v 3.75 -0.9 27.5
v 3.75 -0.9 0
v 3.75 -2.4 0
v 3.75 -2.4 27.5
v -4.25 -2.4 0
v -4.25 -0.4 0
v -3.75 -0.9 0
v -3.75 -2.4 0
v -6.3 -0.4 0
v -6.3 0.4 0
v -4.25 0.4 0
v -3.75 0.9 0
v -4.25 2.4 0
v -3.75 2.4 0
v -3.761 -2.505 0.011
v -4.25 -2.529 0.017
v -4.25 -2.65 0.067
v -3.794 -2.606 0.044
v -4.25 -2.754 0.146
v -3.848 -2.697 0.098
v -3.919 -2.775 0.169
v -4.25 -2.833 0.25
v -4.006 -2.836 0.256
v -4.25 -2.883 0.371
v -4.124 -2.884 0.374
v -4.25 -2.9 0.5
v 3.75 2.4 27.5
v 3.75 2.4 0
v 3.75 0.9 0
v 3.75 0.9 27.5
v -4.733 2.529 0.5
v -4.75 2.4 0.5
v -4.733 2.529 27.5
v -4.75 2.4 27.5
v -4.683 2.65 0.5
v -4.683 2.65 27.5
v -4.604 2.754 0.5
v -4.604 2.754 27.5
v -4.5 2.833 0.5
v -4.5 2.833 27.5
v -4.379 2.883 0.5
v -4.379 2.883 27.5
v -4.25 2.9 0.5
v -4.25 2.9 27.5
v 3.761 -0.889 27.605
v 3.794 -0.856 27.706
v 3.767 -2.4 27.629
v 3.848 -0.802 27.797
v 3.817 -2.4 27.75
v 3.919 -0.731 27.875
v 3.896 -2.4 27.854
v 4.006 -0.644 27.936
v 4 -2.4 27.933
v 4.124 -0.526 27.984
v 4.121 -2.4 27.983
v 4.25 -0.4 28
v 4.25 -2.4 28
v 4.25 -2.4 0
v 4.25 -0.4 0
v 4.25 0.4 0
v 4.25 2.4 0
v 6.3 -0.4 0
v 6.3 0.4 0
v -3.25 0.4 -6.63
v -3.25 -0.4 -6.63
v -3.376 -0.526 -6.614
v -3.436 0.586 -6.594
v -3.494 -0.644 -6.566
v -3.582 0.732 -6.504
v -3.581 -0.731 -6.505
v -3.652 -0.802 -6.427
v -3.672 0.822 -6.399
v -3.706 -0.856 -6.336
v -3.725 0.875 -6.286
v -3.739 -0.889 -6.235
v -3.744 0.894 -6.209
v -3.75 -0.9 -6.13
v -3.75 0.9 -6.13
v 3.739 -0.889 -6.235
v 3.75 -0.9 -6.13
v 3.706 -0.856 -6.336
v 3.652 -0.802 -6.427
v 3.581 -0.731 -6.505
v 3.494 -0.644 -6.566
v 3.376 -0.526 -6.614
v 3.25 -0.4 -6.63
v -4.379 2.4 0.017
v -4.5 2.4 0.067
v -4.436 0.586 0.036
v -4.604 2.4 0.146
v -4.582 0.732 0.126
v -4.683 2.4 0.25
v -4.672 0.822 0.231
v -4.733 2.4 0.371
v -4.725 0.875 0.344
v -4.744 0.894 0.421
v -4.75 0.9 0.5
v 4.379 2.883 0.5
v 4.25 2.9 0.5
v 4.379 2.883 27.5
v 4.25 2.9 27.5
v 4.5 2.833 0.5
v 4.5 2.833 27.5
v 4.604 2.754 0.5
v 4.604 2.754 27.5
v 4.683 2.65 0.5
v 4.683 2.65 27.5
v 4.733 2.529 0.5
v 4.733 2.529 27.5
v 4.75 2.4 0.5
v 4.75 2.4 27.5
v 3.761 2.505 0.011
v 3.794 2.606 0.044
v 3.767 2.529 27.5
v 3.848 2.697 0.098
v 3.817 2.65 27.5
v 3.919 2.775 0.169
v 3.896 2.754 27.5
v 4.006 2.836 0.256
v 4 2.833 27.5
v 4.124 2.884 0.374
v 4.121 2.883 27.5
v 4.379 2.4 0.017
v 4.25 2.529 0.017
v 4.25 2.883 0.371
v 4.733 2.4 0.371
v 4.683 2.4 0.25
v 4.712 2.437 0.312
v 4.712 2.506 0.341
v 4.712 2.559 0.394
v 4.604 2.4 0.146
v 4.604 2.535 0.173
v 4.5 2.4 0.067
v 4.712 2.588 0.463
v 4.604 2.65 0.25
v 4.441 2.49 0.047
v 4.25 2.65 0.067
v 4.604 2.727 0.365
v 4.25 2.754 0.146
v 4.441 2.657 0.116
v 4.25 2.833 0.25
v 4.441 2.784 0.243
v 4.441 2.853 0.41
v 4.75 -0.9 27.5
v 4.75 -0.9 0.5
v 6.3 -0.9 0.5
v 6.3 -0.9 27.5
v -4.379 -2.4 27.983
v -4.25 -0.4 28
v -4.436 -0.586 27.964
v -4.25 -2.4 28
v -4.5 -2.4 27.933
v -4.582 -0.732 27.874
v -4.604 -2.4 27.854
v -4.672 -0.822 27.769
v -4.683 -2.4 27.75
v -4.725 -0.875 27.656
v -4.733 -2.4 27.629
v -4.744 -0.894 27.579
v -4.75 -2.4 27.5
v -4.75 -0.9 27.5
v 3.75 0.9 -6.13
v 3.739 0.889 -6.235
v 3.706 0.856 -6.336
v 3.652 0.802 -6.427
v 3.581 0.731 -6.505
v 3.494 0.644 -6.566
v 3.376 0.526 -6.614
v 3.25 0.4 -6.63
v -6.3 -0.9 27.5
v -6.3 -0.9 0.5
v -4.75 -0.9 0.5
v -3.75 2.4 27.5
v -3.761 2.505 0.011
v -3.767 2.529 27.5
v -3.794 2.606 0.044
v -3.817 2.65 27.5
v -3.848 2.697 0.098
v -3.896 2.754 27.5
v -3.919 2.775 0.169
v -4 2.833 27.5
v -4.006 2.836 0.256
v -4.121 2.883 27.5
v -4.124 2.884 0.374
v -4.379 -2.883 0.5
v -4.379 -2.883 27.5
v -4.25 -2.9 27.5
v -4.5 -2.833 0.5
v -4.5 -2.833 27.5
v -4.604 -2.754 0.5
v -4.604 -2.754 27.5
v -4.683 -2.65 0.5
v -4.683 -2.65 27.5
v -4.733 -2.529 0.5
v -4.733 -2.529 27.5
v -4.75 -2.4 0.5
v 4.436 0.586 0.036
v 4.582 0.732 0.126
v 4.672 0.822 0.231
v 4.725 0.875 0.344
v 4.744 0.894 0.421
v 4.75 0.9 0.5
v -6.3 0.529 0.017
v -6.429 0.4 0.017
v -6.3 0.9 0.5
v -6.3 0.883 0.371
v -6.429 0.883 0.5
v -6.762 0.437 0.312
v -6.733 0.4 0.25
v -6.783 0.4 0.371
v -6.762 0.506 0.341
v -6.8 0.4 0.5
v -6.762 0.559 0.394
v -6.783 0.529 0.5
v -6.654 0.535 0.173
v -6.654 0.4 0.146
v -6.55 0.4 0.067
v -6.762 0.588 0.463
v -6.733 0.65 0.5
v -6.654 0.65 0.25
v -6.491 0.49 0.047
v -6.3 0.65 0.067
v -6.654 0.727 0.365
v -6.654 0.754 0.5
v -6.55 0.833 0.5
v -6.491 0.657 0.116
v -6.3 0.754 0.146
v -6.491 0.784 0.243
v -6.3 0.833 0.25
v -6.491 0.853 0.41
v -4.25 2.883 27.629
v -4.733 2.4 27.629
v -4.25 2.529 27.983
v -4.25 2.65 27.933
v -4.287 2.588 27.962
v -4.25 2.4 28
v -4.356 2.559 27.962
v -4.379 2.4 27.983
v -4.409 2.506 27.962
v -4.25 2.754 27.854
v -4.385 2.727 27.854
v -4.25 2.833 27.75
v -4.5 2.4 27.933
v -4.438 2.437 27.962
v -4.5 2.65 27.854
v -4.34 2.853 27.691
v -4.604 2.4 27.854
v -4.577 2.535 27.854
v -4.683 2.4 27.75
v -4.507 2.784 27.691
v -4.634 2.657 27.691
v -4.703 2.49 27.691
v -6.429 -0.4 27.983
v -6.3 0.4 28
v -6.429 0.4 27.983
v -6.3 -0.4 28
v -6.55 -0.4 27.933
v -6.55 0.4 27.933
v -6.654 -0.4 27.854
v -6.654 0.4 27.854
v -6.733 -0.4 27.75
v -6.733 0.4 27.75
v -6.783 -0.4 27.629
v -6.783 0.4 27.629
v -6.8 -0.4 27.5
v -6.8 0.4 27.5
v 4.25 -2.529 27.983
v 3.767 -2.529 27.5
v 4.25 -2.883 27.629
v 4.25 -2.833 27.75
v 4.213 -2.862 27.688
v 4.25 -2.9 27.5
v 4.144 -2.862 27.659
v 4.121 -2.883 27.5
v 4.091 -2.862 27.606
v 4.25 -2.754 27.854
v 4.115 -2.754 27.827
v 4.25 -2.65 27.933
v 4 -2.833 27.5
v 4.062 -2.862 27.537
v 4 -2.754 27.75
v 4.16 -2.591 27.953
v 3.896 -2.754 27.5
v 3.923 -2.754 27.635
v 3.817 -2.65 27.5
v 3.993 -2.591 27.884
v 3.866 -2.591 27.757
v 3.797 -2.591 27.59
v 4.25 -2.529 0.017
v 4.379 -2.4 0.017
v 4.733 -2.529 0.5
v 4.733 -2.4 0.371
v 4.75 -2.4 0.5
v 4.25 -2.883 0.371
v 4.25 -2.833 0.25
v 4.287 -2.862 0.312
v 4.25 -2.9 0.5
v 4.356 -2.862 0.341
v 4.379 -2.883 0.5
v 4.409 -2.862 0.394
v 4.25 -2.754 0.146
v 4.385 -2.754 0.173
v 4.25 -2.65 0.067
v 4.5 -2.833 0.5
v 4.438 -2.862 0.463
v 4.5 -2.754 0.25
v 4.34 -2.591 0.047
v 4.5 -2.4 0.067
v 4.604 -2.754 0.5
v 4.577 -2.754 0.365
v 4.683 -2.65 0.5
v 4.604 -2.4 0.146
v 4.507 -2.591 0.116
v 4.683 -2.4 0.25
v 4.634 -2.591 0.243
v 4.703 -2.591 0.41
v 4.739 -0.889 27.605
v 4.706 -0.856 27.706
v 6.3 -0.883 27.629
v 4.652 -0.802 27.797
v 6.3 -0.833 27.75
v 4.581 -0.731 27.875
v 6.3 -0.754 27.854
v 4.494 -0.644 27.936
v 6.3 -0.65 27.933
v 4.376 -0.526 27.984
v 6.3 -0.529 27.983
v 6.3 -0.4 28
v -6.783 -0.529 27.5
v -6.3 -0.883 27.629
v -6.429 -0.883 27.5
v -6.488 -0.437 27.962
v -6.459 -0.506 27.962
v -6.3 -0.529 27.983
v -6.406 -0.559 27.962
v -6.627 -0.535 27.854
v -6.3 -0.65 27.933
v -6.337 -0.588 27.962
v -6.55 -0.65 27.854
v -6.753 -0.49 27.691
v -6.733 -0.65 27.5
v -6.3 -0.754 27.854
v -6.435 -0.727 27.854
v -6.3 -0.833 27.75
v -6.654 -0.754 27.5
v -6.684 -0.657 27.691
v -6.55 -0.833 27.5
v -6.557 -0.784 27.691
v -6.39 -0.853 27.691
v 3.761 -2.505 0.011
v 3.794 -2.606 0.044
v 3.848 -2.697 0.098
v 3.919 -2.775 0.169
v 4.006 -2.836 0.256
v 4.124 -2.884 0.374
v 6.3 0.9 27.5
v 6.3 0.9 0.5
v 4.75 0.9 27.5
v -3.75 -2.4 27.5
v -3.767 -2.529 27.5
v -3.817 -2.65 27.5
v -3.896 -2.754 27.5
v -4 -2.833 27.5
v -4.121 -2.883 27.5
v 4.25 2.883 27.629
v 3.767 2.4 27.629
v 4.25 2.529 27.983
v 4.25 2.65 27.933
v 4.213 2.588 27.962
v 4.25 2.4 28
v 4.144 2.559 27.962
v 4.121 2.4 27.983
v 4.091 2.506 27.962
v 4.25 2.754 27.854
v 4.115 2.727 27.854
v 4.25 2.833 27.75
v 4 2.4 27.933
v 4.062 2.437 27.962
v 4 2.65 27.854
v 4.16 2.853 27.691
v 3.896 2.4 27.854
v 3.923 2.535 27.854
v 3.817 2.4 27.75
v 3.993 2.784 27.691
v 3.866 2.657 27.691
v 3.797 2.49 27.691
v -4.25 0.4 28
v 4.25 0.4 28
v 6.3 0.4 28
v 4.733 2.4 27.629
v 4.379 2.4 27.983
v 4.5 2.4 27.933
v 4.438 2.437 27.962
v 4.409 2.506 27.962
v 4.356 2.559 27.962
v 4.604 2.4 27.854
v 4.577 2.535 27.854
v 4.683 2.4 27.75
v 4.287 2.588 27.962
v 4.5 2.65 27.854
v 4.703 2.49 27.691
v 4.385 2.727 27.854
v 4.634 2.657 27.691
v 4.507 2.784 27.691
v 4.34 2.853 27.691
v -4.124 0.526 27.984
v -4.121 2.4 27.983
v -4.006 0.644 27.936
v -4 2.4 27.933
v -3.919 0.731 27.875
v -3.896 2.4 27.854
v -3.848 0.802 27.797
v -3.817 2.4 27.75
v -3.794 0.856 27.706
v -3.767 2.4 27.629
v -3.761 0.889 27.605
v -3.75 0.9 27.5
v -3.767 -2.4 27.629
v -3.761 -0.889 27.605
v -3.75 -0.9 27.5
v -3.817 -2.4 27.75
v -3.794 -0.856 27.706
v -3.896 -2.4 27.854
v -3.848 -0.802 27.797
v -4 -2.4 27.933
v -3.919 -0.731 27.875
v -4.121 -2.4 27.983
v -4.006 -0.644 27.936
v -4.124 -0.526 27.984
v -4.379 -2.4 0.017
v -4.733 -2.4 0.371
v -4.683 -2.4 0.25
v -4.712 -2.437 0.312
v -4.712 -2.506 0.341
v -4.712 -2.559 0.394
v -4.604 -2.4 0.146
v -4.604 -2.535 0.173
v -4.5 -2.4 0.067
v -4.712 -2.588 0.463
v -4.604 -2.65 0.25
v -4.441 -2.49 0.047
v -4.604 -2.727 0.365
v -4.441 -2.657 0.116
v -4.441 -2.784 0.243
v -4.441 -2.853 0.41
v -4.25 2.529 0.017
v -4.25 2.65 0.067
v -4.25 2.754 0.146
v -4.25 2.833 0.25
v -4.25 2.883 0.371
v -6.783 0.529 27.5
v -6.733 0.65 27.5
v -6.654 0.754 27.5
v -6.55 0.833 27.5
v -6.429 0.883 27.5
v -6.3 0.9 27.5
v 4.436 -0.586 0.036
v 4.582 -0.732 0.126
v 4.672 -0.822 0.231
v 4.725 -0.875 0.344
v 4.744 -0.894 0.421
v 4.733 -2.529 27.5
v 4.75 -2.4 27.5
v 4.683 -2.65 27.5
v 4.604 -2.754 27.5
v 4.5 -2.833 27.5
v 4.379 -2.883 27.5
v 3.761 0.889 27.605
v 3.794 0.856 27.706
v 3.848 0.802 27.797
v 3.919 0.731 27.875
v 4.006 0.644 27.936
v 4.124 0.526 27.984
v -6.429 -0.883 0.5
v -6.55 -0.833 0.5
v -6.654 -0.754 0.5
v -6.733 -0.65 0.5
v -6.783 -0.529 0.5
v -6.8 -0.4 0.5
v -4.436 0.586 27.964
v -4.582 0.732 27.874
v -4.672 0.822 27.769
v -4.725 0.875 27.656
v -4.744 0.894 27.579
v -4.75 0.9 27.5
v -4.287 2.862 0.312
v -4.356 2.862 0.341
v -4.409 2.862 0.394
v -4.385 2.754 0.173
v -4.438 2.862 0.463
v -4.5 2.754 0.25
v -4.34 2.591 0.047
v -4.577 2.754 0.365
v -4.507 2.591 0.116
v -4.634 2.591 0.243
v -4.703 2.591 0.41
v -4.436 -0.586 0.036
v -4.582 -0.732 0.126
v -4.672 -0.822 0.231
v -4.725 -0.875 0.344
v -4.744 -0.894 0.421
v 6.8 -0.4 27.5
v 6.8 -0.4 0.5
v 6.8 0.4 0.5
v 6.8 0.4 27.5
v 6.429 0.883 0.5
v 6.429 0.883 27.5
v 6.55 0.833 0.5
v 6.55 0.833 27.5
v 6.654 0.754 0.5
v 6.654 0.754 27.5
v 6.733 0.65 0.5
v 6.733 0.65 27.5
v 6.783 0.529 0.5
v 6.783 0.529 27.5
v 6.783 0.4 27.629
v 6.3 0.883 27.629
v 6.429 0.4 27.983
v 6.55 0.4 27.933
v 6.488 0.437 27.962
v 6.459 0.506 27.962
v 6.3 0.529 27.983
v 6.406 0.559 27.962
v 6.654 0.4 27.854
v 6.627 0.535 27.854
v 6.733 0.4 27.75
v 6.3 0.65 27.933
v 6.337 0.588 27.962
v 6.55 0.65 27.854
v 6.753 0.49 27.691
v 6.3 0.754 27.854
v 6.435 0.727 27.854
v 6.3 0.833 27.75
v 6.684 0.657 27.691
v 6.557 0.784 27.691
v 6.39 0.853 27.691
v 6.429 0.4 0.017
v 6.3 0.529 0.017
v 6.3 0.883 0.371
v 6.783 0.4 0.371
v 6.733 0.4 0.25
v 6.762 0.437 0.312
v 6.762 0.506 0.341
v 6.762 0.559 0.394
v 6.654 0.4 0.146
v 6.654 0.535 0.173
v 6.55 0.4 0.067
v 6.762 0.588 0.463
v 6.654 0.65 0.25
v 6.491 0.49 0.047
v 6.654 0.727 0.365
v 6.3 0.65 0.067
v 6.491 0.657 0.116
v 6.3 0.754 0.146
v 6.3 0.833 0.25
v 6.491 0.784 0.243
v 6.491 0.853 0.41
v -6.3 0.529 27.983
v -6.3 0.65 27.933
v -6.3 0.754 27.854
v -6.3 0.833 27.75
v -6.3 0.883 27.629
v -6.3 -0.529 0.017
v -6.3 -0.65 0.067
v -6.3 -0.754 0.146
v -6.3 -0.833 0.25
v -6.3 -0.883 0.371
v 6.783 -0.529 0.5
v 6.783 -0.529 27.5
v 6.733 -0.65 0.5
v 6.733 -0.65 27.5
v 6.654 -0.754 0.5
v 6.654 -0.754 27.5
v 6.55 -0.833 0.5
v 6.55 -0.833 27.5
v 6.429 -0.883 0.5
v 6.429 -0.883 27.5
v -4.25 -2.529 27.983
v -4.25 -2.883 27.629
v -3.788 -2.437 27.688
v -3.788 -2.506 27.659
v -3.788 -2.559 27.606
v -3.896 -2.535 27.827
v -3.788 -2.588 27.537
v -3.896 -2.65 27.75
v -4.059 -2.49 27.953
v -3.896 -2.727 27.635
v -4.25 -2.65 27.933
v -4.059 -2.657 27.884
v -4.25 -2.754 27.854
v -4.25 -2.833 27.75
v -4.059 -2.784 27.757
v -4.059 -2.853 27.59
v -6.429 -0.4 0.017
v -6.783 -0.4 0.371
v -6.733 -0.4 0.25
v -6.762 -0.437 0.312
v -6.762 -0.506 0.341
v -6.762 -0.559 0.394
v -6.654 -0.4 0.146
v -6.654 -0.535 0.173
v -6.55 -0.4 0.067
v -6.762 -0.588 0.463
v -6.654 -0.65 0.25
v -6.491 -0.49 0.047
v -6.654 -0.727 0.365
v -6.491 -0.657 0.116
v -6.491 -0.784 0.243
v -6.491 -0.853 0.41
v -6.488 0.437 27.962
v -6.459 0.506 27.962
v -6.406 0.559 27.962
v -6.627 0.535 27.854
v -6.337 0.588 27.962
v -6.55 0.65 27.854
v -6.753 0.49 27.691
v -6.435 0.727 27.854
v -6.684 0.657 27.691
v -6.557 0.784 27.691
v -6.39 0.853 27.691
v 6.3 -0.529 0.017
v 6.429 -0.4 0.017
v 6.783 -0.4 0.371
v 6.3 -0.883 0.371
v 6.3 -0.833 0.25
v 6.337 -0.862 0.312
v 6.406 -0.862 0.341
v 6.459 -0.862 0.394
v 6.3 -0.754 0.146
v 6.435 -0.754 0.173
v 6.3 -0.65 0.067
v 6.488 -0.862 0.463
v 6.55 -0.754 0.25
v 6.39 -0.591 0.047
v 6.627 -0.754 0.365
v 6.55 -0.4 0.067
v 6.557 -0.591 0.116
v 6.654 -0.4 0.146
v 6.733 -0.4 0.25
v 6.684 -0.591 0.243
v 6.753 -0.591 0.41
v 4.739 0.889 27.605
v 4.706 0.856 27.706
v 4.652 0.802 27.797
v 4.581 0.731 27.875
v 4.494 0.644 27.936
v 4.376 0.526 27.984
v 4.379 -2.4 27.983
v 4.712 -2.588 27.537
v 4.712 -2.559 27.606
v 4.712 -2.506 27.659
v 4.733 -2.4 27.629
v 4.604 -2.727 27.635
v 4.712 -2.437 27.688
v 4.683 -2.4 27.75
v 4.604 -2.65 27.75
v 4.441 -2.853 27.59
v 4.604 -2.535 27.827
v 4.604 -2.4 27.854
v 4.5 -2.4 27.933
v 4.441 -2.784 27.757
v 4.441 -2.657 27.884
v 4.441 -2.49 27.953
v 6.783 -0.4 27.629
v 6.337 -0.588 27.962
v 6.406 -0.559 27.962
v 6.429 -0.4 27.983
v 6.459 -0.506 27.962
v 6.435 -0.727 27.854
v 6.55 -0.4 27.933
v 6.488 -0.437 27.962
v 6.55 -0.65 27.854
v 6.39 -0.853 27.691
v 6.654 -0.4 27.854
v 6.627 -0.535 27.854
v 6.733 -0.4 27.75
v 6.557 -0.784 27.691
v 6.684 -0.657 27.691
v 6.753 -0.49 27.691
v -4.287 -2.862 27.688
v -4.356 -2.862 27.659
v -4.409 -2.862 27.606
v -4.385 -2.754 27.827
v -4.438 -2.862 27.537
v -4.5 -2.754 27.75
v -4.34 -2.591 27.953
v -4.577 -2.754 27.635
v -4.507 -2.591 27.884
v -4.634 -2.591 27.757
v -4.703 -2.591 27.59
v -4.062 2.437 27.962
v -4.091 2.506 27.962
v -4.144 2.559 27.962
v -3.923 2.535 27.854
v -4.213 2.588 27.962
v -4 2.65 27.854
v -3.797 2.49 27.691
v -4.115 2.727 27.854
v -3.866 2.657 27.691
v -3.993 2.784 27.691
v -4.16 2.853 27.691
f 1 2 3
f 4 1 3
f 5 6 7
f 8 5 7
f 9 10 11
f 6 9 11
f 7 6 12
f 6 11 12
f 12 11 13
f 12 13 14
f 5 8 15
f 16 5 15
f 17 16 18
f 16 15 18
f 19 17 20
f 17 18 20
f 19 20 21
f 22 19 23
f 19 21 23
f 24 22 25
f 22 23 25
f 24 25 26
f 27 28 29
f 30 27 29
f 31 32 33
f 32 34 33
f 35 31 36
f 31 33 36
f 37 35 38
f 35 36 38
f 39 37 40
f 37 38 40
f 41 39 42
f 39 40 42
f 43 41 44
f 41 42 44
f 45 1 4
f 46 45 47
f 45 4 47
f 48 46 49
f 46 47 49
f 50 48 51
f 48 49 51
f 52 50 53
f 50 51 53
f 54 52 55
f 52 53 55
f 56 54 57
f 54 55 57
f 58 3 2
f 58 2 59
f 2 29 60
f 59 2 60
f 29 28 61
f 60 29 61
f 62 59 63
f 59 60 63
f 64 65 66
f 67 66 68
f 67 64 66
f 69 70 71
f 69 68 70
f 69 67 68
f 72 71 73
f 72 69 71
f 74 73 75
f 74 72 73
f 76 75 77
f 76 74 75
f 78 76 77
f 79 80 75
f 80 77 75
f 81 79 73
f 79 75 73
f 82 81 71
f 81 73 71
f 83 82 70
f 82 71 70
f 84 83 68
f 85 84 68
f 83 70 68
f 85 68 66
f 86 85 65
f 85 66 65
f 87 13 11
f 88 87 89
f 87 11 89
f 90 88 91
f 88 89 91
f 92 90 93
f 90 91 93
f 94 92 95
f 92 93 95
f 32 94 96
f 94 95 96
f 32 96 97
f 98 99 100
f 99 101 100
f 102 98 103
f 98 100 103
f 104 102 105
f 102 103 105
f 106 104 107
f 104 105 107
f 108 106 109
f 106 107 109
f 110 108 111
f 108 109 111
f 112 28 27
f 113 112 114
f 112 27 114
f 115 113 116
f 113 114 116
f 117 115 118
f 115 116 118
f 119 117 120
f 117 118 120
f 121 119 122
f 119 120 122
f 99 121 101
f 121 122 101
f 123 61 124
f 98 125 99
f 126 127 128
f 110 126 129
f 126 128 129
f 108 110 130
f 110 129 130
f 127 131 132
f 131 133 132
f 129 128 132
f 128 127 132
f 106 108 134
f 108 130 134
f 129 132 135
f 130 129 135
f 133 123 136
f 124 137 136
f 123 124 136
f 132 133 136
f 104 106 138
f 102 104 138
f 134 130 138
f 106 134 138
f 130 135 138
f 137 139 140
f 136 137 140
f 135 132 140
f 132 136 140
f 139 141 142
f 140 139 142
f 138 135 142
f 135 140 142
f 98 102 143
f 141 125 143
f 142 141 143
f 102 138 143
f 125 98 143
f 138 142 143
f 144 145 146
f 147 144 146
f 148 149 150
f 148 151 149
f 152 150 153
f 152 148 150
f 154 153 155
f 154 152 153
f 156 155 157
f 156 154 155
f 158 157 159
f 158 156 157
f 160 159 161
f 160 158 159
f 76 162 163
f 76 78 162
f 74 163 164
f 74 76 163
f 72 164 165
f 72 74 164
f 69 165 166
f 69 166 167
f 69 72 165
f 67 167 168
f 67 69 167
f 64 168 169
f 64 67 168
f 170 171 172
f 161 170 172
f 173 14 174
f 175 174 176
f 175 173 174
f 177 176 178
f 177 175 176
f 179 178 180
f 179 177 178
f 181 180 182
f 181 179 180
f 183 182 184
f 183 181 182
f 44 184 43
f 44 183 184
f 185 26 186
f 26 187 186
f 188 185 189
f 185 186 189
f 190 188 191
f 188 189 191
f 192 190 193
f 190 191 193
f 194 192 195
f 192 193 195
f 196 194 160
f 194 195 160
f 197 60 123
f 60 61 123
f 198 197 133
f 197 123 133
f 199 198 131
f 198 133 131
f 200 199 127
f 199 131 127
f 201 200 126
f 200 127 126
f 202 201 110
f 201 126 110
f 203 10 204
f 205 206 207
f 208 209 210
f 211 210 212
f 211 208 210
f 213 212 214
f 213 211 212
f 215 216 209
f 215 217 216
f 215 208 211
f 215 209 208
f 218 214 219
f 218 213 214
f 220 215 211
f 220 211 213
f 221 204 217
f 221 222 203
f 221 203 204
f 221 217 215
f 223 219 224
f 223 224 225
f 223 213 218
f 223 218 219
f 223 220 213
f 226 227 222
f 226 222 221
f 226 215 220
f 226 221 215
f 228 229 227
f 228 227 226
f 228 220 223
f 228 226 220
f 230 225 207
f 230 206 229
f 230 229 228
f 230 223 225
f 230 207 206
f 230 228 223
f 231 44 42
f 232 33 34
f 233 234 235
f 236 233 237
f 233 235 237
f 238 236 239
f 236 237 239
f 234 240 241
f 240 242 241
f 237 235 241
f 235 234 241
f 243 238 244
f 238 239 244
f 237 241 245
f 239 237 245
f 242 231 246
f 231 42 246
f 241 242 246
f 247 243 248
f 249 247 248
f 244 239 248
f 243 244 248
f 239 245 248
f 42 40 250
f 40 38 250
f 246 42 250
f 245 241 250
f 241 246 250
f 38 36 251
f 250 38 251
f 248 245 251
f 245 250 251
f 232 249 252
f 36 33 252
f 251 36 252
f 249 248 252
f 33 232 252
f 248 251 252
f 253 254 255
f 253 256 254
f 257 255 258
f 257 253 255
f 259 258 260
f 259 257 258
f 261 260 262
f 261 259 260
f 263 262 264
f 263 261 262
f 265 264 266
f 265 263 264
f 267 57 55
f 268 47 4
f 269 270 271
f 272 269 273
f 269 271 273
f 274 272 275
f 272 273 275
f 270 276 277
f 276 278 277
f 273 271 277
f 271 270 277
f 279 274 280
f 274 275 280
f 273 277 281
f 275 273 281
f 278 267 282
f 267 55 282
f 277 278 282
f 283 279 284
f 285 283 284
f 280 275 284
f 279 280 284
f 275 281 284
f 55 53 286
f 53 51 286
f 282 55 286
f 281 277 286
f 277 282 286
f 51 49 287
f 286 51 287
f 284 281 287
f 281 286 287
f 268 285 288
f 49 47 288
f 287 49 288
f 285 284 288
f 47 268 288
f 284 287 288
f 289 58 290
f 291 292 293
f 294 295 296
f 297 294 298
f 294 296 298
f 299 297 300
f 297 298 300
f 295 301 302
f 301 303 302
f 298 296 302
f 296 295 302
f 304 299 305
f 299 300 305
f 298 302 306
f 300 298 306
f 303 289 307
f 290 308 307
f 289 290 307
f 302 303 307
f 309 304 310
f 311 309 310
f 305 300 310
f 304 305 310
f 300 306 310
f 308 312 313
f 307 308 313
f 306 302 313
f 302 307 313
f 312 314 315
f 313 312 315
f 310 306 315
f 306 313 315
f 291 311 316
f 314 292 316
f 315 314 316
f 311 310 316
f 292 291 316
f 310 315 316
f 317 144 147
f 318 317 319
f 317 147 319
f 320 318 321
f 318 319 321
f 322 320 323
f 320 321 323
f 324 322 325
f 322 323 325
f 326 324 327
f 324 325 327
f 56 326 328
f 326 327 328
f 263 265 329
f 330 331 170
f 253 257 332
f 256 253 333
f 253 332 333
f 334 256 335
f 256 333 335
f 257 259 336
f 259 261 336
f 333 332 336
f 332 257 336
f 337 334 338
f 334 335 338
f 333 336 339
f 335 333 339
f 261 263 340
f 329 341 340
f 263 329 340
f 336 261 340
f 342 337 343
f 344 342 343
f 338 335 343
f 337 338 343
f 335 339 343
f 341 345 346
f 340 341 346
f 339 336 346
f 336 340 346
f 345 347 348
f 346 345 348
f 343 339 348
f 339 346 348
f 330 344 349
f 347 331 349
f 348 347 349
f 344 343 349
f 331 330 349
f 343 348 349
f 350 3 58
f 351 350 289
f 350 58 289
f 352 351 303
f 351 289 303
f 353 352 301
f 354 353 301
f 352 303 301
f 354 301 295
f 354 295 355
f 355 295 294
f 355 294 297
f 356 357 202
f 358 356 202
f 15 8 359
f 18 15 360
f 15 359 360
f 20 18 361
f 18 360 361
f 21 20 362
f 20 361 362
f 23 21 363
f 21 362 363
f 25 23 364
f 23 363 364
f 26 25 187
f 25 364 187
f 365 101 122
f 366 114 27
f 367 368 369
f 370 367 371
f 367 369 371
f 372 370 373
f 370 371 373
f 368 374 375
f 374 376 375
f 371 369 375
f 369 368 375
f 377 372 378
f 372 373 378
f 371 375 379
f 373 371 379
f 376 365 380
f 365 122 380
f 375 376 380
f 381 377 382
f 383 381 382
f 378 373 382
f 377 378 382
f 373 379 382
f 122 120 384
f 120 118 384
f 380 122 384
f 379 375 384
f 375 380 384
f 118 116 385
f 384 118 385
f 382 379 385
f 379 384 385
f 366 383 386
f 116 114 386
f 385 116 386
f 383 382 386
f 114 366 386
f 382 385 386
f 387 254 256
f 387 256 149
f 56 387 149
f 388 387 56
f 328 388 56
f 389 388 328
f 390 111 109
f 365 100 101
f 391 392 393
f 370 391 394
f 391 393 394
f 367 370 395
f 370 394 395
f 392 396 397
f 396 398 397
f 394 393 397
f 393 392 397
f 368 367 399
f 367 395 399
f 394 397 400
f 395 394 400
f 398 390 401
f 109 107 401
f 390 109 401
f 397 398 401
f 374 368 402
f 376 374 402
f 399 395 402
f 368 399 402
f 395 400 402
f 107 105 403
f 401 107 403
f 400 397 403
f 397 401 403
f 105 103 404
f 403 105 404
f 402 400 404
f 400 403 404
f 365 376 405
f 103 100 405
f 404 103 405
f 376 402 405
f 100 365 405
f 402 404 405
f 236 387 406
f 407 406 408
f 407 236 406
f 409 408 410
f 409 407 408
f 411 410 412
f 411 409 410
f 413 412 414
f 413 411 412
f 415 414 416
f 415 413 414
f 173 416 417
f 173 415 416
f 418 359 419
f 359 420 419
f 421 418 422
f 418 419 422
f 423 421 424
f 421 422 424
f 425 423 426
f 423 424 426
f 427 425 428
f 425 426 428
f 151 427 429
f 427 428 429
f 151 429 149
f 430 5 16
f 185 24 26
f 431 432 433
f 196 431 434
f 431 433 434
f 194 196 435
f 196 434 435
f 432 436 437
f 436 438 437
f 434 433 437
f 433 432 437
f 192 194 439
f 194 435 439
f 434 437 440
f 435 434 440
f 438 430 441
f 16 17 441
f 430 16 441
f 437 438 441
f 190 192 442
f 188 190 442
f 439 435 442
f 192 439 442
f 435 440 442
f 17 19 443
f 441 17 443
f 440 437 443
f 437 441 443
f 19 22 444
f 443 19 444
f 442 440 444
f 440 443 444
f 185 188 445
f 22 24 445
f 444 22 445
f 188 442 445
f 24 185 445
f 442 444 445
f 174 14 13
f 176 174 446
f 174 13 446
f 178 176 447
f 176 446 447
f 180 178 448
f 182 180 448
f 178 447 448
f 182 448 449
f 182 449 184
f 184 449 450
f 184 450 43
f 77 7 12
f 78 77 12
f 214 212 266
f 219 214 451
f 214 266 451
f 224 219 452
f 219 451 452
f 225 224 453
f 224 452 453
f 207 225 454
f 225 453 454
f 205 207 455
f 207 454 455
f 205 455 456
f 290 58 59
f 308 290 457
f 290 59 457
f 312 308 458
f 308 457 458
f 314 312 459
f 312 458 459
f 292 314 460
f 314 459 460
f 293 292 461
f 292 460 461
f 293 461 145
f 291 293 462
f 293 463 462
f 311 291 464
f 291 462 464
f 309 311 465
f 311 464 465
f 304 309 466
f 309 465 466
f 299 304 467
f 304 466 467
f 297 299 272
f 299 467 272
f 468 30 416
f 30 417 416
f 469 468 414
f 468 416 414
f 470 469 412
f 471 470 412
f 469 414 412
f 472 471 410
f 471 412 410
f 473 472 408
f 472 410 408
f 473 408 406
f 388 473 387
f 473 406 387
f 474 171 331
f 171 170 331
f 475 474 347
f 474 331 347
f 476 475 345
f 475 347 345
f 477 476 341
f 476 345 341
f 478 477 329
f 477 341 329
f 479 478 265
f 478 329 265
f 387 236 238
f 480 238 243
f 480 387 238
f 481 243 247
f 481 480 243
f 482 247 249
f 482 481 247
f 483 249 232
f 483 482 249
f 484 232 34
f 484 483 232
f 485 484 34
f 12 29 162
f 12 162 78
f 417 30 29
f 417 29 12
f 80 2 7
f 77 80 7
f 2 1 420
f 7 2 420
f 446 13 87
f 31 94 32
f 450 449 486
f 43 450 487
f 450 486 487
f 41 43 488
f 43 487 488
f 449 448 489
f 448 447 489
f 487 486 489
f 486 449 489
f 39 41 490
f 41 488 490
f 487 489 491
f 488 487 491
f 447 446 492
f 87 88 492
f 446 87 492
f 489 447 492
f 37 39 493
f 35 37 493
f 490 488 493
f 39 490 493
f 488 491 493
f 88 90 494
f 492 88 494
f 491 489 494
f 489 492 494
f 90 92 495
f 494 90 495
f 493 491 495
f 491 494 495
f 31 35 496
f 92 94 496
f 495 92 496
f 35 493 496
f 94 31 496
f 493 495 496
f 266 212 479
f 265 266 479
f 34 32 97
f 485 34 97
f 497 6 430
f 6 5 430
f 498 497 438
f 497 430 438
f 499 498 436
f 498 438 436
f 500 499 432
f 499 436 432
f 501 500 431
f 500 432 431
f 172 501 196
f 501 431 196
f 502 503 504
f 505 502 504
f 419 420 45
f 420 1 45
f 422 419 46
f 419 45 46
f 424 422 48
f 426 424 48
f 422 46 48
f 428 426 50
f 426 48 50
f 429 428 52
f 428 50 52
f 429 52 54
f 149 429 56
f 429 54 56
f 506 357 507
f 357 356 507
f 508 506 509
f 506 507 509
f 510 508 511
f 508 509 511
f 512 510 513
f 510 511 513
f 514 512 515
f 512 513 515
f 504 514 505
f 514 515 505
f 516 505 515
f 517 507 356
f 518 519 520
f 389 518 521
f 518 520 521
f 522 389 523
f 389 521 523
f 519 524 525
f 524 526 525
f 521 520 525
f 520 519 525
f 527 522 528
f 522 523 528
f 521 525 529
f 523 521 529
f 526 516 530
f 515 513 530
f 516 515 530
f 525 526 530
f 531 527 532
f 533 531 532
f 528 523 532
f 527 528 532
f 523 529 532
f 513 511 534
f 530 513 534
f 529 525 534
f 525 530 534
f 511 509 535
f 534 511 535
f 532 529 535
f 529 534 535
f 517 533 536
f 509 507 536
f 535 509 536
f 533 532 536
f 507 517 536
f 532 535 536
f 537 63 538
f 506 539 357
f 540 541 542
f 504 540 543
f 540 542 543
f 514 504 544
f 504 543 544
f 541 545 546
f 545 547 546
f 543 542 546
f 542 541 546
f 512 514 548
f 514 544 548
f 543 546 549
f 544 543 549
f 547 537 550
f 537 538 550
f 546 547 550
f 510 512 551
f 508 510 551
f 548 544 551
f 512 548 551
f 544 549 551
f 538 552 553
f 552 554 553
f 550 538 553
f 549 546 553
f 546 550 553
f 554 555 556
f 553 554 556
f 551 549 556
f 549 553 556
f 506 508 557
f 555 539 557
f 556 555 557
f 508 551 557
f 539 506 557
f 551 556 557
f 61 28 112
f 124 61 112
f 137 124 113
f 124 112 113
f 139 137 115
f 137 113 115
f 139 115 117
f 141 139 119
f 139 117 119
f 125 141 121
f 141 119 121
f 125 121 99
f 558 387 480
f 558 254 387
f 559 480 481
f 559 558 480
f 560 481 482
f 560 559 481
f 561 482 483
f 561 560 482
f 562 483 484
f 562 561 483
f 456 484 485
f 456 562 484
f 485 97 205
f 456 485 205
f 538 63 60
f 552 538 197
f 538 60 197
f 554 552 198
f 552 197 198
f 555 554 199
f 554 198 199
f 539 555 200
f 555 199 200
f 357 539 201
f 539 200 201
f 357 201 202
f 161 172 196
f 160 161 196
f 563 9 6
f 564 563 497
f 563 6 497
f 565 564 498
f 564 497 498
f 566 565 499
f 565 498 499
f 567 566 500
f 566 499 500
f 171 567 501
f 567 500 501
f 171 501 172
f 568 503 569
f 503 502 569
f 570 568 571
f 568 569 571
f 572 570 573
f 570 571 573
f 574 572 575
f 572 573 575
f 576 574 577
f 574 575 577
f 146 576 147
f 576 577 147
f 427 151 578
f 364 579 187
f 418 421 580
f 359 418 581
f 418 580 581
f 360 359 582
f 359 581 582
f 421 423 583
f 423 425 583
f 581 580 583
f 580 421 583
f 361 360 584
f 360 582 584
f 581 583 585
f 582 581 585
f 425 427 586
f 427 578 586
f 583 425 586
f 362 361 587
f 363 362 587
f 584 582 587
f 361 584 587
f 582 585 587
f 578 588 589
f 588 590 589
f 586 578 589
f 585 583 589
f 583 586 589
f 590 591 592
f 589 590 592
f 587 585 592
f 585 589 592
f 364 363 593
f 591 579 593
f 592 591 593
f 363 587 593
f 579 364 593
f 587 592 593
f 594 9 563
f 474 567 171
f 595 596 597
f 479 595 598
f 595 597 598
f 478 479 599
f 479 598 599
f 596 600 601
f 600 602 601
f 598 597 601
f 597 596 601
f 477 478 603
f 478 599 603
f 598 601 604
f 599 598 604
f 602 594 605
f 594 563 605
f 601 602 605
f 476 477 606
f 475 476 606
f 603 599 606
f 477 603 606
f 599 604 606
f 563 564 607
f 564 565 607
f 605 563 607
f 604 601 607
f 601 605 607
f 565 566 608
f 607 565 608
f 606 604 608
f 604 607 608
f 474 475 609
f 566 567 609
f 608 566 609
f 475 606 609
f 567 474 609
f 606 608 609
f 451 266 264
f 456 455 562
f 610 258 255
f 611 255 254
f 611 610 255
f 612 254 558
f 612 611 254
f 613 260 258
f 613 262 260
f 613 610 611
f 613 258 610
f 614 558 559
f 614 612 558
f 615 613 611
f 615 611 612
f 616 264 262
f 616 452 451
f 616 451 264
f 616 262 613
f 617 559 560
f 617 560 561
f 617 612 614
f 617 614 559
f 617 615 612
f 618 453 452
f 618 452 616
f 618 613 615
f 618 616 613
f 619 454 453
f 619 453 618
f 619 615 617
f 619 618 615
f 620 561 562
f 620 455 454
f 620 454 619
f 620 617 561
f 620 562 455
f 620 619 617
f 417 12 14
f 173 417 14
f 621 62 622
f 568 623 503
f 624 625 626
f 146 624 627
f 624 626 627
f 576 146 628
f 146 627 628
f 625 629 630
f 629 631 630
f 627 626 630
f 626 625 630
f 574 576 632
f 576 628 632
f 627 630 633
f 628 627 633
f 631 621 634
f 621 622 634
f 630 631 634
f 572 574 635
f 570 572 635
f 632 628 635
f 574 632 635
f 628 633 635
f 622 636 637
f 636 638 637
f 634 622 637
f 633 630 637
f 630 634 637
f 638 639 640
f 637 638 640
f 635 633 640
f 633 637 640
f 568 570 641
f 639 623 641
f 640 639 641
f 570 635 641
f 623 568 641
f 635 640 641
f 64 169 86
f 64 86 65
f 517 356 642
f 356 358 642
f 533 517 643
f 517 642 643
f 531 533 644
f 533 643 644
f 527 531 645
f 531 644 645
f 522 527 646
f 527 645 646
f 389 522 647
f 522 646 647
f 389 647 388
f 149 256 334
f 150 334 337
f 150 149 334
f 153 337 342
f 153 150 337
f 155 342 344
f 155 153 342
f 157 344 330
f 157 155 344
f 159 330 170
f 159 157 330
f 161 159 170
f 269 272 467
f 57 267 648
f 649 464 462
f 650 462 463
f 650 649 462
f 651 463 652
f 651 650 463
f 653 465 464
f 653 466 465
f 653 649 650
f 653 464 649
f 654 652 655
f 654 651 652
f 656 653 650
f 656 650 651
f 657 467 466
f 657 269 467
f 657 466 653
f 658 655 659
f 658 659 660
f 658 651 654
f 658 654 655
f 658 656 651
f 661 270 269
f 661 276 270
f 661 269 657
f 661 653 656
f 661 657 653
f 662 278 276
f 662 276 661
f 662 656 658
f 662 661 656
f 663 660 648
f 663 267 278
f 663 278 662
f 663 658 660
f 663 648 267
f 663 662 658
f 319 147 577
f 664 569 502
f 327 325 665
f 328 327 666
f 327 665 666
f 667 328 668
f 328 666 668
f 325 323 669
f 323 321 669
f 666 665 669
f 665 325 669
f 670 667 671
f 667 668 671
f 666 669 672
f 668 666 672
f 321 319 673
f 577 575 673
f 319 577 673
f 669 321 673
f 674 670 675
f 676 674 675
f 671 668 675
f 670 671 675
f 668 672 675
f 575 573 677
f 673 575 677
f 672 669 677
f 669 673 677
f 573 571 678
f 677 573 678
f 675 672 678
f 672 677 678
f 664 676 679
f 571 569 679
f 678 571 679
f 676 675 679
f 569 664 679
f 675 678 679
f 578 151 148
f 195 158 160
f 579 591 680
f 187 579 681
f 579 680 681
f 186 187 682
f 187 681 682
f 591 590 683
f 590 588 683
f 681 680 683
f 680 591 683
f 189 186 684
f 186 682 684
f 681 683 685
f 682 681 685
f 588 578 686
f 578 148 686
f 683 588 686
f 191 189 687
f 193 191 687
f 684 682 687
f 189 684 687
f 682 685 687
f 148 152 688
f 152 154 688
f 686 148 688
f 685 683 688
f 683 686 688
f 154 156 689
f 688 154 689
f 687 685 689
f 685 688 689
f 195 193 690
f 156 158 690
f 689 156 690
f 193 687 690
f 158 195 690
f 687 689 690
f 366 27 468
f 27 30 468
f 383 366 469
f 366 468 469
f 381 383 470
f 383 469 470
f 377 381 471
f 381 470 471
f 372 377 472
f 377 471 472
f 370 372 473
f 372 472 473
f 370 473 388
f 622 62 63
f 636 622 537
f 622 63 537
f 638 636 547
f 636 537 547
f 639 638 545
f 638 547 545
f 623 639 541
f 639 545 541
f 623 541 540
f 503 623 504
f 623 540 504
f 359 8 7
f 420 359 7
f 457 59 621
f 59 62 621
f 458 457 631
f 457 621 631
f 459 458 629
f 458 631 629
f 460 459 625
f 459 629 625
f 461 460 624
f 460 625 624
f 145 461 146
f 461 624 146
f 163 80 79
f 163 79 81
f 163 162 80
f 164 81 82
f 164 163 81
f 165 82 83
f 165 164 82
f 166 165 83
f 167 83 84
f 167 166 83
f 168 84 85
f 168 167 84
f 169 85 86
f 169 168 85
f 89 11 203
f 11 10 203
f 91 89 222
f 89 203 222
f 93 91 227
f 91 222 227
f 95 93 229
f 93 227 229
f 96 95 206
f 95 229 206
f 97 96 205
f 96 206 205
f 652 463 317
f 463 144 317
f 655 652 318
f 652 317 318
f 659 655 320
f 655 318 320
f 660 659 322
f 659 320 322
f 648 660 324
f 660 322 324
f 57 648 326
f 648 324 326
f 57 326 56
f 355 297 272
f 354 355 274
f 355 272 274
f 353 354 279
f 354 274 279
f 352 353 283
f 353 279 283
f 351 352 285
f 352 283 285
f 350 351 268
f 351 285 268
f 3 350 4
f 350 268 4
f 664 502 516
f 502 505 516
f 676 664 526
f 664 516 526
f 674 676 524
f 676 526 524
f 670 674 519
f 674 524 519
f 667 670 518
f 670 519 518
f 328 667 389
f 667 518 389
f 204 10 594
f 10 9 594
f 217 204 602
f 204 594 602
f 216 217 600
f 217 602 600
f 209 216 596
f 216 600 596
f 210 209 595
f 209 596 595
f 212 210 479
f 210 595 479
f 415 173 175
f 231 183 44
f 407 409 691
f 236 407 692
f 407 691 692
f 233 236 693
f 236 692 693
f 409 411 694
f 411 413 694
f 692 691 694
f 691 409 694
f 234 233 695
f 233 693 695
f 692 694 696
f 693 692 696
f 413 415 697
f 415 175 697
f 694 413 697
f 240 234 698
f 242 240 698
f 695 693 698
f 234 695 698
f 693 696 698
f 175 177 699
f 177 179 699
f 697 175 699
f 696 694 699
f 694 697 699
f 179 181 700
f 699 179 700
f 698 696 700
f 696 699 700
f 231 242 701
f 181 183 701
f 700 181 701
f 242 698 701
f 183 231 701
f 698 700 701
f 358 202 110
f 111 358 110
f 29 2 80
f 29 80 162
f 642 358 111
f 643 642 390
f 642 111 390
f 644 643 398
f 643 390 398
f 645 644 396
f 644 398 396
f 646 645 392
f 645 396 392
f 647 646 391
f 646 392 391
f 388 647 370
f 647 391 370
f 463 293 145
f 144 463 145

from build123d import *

# Parameters (mm, degrees)
AUFSATZ_LINEAR_AUSTRAGEN1_DEPTH = 28
SKIZZE2_W                       = 7.5
SKIZZE2_H                       = 1.8
AUFSATZ_LINEAR_AUSTRAGEN2_DEPTH = 6.63
VERRUNDUNG1_R                   = 0.5


with BuildPart() as part:
    # Skizze1 → Aufsatz-Linear austragen1 (new body)
    with BuildSketch(Plane.XY):
        Polygon((-4.75, 0.9), (-6.8, 0.9), (-6.8, -0.9), (-4.75, -0.9), (-4.75, -2.9), (-3.75, -2.9), (-3.75, -0.9), (3.75, -0.9), (3.75, -2.9), (4.75, -2.9), (4.75, -0.9), (6.8, -0.9), (6.8, 0.9), (4.75, 0.9), (4.75, 2.9), (3.75, 2.9), (3.75, 0.9), (-3.75, 0.9), (-3.75, 2.9), (-4.75, 2.9), align=None)
    extrude(amount=AUFSATZ_LINEAR_AUSTRAGEN1_DEPTH)

    # Skizze2 → Aufsatz-Linear austragen2 (add)
    with BuildSketch(Plane(origin=(0, 0, 0), x_dir=(-1, 0, 0), z_dir=(0, 0, -1))):
        Rectangle(SKIZZE2_W, SKIZZE2_H)
    extrude(amount=AUFSATZ_LINEAR_AUSTRAGEN2_DEPTH)

    # Verrundung1
    verrundung1_edges = [part.edges().sort_by_distance(p)[0] for p in [
        (-4.75, -1.9, 28),
        (-4.25, -2.9, 28),
        (-5.775, 0.9, 0),
        (-4.75, 1.9, 0),
        (-4.25, 2.9, 0),
        (-3.75, -1.9, 28),
        (4.25, 2.9, 0),
        (4.75, 1.9, 0),
        (5.775, 0.9, 0),
        (6.8, 0, 0),
        (5.775, -0.9, 0),
        (4.75, -1.9, 0),
        (4.25, -2.9, 0),
        (0, -0.9, 28),
        (-4.25, -2.9, 0),
        (-4.75, -1.9, 0),
        (-5.775, -0.9, 0),
        (-6.8, 0, 0),
        (3.75, -1.9, 28),
        (4.25, -2.9, 28),
        (-6.8, 0.9, 14),
        (-4.75, 2.9, 14),
        (-3.75, 2.9, 14),
        (3.75, 2.9, 14),
        (4.75, 2.9, 14),
        (6.8, 0.9, 14),
        (6.8, -0.9, 14),
        (4.75, -2.9, 14),
        (3.75, -2.9, 14),
        (-3.75, -2.9, 14),
        (-4.75, -2.9, 14),
        (-6.8, -0.9, 14),
        (4.75, -1.9, 28),
        (5.775, -0.9, 28),
        (6.8, 0, 28),
        (5.775, 0.9, 28),
        (-6.8, 0, 28),
        (4.75, 1.9, 28),
        (4.25, 2.9, 28),
        (3.75, 0, -6.63),
        (0, -0.9, -6.63),
        (-3.75, 0, -6.63),
        (0, 0.9, -6.63),
        (3.75, 1.9, 28),
        (0, 0.9, 28),
        (-3.75, 1.9, 28),
        (-4.25, 2.9, 28),
        (-4.75, 1.9, 28),
        (-5.775, 0.9, 28),
        (-5.775, -0.9, 28),
    ]]
    fillet(verrundung1_edges, radius=VERRUNDUNG1_R - 0.0001)  # a hair under: the kernel refuses the full size


solid = part.part
